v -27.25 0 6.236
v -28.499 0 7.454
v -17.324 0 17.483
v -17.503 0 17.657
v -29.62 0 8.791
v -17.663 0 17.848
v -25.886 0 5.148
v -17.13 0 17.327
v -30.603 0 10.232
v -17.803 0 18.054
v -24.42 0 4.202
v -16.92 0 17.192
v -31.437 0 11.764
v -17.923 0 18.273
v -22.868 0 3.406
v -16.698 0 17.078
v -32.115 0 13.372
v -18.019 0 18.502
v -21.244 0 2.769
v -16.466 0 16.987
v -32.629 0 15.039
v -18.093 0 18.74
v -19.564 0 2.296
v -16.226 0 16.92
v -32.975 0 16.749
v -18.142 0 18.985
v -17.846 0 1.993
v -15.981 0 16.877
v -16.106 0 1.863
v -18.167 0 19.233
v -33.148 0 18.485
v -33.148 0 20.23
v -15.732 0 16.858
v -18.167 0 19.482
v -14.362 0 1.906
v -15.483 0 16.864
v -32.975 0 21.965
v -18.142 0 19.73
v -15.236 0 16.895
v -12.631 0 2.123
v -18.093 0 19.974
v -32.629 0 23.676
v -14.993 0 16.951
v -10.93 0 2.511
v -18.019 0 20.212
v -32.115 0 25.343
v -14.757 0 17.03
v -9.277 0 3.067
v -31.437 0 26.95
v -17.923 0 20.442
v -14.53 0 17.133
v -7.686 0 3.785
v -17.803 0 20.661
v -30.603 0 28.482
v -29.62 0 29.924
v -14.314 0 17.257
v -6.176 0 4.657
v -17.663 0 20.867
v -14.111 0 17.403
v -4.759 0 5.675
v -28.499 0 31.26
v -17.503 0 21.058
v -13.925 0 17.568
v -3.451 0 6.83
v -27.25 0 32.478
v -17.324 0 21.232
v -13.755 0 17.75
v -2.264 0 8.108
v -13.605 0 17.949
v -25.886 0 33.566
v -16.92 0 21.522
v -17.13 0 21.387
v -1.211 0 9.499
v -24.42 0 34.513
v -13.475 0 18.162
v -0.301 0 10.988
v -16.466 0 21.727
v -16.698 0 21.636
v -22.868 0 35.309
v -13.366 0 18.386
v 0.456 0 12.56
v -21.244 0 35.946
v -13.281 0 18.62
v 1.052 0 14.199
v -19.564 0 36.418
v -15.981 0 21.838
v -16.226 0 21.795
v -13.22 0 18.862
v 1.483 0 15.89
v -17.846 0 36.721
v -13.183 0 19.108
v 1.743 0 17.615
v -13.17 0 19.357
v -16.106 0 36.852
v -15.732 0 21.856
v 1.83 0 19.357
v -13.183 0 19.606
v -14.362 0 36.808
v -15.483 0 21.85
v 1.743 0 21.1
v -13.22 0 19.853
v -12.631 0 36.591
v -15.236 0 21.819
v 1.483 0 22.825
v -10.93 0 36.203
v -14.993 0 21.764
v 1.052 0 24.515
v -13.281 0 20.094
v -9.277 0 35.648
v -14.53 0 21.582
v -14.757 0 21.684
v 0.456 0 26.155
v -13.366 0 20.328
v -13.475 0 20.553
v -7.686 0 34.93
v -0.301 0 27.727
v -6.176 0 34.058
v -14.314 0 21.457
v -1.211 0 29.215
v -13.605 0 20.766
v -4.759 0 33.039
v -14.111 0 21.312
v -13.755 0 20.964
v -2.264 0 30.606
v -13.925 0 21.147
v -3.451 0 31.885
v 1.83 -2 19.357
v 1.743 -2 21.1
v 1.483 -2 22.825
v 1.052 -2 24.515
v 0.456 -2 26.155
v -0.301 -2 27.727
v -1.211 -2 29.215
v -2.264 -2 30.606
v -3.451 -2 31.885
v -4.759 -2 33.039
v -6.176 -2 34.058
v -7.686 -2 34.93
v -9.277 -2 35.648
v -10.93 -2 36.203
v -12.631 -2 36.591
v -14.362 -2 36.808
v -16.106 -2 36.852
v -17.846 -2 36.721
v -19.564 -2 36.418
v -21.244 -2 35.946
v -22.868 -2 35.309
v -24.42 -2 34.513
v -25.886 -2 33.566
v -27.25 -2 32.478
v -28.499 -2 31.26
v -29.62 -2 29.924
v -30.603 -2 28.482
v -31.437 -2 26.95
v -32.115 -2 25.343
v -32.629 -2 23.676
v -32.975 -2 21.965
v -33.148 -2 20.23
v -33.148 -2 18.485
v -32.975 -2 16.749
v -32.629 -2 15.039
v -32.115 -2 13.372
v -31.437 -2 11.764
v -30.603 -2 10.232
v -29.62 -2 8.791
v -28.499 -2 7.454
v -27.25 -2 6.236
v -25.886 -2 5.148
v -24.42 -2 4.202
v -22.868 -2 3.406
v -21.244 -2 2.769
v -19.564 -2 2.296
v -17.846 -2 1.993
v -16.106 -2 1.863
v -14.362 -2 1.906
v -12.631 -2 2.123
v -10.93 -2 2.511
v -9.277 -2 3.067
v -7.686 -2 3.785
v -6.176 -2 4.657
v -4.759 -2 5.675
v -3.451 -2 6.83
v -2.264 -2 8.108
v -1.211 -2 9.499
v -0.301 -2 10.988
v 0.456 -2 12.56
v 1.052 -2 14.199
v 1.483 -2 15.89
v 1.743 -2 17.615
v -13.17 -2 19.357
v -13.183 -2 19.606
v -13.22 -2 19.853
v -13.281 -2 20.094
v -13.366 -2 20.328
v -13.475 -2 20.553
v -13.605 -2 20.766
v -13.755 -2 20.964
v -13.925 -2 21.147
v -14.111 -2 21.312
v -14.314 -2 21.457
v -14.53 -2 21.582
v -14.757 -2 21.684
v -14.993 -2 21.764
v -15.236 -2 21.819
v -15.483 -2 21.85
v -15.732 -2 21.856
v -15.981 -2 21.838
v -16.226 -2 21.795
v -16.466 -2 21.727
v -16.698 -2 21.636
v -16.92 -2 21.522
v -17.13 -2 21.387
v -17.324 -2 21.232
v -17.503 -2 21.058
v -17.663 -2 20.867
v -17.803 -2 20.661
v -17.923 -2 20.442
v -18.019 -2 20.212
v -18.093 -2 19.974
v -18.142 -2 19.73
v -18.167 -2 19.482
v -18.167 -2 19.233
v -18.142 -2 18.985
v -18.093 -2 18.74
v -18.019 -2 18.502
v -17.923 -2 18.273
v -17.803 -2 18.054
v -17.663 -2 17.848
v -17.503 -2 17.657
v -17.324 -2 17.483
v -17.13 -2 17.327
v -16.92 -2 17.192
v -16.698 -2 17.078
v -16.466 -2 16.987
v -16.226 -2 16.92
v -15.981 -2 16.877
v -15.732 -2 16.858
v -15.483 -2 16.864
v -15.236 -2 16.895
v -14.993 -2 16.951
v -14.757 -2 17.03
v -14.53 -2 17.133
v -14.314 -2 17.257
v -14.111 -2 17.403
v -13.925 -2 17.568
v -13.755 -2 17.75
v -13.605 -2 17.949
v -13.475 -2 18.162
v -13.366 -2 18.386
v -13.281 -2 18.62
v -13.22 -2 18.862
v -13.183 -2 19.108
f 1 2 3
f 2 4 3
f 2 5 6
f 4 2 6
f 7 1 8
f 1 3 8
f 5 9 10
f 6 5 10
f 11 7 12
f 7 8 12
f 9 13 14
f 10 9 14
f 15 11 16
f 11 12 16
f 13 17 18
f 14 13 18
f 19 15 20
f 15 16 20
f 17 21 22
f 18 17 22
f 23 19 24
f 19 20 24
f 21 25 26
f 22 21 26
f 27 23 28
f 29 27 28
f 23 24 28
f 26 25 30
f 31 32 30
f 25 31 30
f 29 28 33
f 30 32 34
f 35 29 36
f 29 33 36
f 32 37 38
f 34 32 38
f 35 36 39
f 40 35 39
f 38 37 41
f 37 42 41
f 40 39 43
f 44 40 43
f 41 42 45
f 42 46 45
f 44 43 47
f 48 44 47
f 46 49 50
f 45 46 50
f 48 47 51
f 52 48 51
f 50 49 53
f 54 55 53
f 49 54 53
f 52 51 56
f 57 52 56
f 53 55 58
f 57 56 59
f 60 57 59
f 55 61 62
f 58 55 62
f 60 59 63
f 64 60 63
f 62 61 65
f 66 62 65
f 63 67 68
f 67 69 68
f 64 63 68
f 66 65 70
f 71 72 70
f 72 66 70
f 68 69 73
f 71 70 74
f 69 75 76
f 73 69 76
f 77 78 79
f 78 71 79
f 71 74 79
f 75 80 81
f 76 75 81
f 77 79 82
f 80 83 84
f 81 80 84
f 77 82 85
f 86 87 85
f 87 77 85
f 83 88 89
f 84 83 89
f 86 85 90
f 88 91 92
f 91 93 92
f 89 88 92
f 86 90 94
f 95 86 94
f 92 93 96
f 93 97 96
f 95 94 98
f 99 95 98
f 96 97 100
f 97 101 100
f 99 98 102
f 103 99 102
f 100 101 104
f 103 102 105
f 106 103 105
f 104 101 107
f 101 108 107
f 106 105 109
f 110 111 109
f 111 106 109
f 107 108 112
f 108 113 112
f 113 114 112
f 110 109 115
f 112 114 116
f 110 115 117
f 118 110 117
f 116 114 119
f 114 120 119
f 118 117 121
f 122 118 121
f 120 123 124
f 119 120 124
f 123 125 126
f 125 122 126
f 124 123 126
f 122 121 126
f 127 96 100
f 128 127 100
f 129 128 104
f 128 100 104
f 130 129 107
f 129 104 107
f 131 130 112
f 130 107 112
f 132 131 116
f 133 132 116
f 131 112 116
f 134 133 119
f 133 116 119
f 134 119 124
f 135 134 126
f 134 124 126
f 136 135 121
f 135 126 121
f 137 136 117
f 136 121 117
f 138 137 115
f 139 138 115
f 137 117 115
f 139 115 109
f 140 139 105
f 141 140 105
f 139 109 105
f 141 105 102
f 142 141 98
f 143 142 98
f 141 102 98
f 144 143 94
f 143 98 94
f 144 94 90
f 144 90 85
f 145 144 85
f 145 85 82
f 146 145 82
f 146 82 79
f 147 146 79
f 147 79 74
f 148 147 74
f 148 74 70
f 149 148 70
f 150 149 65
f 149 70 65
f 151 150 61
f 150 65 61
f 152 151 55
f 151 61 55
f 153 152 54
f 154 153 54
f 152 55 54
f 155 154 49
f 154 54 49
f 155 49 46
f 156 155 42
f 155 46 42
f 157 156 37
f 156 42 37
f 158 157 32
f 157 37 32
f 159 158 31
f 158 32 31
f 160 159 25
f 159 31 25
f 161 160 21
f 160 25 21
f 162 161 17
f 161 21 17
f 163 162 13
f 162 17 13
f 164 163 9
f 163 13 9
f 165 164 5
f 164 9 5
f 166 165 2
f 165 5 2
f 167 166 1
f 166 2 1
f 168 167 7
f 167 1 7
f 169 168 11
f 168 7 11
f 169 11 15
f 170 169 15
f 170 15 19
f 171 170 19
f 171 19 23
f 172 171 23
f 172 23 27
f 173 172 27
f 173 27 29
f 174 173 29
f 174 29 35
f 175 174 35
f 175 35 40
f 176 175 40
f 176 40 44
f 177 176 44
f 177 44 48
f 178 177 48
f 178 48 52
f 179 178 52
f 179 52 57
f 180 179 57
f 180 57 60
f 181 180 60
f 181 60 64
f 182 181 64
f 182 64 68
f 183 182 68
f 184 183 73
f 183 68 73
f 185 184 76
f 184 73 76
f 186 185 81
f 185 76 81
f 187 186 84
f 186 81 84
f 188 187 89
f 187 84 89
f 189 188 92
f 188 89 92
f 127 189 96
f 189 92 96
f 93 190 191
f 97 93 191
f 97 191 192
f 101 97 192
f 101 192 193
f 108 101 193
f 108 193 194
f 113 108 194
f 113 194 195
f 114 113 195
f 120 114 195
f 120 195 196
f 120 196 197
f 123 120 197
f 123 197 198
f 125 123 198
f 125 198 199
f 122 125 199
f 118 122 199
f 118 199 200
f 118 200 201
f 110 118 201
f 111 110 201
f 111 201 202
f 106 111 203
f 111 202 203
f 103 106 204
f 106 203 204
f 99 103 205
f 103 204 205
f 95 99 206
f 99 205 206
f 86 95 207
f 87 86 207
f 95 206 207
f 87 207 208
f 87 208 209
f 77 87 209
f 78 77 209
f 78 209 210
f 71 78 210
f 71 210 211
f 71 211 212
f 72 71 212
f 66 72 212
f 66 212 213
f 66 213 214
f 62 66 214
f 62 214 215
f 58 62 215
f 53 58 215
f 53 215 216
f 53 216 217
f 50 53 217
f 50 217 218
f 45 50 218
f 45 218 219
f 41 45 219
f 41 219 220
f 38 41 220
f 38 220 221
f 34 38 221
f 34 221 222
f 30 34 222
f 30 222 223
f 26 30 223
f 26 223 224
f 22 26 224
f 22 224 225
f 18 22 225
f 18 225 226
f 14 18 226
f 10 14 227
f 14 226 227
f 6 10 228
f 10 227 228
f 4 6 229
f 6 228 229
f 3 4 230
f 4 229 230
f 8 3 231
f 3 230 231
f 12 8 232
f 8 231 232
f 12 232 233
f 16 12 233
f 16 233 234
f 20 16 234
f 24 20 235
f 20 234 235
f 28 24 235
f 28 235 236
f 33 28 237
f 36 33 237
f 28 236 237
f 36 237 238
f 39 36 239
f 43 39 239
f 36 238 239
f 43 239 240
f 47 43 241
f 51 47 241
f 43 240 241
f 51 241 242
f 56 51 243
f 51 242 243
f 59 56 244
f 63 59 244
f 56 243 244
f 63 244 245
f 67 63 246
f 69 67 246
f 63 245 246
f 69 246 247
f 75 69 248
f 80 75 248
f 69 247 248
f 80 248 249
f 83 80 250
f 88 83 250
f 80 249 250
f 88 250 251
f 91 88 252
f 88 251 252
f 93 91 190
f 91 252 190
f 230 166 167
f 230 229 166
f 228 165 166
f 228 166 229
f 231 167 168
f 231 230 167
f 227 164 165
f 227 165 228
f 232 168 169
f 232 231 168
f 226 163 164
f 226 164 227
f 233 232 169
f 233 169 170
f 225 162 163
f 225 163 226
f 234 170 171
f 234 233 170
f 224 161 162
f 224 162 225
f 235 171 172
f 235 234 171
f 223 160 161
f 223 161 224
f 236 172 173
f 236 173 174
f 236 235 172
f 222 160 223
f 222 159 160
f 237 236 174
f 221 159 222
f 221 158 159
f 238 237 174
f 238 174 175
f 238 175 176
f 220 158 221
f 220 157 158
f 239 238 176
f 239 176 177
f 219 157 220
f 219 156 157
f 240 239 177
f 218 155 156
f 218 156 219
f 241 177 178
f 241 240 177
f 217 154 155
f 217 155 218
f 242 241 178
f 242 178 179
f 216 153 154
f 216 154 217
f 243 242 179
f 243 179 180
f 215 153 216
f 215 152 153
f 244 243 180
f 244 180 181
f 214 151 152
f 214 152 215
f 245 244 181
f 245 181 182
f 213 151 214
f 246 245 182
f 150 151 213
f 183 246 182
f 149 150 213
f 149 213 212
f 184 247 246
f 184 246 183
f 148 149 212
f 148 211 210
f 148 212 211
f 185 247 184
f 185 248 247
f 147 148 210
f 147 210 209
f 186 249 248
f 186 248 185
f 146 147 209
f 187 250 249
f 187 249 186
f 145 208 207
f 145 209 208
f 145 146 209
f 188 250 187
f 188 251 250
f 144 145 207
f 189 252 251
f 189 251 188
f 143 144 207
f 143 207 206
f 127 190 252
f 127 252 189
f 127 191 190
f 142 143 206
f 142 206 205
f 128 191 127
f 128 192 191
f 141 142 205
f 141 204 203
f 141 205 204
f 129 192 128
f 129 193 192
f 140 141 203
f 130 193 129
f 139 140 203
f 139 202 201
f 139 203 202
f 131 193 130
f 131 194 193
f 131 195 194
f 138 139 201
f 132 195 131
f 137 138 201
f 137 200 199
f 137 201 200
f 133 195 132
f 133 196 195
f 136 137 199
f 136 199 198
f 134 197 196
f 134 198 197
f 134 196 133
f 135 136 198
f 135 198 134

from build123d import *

# Parameters (mm, degrees)
F0_R     = 17.5
F1_DEPTH = 2.00000108
F2_R     = 2.5
F3_DEPTH = 6
F6_DEPTH = 8.00100108


# Not quite as in the source:
# - a feature of the source that left no trace in its solid (it failed there, or was rolled back) is left out


with BuildPart() as f1:
    # F0 (on Front) → F1 (new body)
    with BuildSketch(Plane.XZ):
        with Locations((-15.6701616943, 19.357258454)):
            Circle(F0_R)
    extrude(amount=F1_DEPTH)

    # F2 (on face) → F3 (join)
    with BuildSketch(Plane.XZ.offset(2.00000108)):
        with Locations((-15.6701616943, 19.357258454)):
            Circle(F2_R)
    extrude(amount=F3_DEPTH)

    # F6 (cut, through all): a face of the model
    f6_faces = [f1.faces().sort_by_distance(p)[0] for p in [
        (-15.6701616943, -8.00000108, 19.357258454),
    ]]
    extrude(f6_faces, amount=-F6_DEPTH, mode=Mode.SUBTRACT)


solid = f1.part
